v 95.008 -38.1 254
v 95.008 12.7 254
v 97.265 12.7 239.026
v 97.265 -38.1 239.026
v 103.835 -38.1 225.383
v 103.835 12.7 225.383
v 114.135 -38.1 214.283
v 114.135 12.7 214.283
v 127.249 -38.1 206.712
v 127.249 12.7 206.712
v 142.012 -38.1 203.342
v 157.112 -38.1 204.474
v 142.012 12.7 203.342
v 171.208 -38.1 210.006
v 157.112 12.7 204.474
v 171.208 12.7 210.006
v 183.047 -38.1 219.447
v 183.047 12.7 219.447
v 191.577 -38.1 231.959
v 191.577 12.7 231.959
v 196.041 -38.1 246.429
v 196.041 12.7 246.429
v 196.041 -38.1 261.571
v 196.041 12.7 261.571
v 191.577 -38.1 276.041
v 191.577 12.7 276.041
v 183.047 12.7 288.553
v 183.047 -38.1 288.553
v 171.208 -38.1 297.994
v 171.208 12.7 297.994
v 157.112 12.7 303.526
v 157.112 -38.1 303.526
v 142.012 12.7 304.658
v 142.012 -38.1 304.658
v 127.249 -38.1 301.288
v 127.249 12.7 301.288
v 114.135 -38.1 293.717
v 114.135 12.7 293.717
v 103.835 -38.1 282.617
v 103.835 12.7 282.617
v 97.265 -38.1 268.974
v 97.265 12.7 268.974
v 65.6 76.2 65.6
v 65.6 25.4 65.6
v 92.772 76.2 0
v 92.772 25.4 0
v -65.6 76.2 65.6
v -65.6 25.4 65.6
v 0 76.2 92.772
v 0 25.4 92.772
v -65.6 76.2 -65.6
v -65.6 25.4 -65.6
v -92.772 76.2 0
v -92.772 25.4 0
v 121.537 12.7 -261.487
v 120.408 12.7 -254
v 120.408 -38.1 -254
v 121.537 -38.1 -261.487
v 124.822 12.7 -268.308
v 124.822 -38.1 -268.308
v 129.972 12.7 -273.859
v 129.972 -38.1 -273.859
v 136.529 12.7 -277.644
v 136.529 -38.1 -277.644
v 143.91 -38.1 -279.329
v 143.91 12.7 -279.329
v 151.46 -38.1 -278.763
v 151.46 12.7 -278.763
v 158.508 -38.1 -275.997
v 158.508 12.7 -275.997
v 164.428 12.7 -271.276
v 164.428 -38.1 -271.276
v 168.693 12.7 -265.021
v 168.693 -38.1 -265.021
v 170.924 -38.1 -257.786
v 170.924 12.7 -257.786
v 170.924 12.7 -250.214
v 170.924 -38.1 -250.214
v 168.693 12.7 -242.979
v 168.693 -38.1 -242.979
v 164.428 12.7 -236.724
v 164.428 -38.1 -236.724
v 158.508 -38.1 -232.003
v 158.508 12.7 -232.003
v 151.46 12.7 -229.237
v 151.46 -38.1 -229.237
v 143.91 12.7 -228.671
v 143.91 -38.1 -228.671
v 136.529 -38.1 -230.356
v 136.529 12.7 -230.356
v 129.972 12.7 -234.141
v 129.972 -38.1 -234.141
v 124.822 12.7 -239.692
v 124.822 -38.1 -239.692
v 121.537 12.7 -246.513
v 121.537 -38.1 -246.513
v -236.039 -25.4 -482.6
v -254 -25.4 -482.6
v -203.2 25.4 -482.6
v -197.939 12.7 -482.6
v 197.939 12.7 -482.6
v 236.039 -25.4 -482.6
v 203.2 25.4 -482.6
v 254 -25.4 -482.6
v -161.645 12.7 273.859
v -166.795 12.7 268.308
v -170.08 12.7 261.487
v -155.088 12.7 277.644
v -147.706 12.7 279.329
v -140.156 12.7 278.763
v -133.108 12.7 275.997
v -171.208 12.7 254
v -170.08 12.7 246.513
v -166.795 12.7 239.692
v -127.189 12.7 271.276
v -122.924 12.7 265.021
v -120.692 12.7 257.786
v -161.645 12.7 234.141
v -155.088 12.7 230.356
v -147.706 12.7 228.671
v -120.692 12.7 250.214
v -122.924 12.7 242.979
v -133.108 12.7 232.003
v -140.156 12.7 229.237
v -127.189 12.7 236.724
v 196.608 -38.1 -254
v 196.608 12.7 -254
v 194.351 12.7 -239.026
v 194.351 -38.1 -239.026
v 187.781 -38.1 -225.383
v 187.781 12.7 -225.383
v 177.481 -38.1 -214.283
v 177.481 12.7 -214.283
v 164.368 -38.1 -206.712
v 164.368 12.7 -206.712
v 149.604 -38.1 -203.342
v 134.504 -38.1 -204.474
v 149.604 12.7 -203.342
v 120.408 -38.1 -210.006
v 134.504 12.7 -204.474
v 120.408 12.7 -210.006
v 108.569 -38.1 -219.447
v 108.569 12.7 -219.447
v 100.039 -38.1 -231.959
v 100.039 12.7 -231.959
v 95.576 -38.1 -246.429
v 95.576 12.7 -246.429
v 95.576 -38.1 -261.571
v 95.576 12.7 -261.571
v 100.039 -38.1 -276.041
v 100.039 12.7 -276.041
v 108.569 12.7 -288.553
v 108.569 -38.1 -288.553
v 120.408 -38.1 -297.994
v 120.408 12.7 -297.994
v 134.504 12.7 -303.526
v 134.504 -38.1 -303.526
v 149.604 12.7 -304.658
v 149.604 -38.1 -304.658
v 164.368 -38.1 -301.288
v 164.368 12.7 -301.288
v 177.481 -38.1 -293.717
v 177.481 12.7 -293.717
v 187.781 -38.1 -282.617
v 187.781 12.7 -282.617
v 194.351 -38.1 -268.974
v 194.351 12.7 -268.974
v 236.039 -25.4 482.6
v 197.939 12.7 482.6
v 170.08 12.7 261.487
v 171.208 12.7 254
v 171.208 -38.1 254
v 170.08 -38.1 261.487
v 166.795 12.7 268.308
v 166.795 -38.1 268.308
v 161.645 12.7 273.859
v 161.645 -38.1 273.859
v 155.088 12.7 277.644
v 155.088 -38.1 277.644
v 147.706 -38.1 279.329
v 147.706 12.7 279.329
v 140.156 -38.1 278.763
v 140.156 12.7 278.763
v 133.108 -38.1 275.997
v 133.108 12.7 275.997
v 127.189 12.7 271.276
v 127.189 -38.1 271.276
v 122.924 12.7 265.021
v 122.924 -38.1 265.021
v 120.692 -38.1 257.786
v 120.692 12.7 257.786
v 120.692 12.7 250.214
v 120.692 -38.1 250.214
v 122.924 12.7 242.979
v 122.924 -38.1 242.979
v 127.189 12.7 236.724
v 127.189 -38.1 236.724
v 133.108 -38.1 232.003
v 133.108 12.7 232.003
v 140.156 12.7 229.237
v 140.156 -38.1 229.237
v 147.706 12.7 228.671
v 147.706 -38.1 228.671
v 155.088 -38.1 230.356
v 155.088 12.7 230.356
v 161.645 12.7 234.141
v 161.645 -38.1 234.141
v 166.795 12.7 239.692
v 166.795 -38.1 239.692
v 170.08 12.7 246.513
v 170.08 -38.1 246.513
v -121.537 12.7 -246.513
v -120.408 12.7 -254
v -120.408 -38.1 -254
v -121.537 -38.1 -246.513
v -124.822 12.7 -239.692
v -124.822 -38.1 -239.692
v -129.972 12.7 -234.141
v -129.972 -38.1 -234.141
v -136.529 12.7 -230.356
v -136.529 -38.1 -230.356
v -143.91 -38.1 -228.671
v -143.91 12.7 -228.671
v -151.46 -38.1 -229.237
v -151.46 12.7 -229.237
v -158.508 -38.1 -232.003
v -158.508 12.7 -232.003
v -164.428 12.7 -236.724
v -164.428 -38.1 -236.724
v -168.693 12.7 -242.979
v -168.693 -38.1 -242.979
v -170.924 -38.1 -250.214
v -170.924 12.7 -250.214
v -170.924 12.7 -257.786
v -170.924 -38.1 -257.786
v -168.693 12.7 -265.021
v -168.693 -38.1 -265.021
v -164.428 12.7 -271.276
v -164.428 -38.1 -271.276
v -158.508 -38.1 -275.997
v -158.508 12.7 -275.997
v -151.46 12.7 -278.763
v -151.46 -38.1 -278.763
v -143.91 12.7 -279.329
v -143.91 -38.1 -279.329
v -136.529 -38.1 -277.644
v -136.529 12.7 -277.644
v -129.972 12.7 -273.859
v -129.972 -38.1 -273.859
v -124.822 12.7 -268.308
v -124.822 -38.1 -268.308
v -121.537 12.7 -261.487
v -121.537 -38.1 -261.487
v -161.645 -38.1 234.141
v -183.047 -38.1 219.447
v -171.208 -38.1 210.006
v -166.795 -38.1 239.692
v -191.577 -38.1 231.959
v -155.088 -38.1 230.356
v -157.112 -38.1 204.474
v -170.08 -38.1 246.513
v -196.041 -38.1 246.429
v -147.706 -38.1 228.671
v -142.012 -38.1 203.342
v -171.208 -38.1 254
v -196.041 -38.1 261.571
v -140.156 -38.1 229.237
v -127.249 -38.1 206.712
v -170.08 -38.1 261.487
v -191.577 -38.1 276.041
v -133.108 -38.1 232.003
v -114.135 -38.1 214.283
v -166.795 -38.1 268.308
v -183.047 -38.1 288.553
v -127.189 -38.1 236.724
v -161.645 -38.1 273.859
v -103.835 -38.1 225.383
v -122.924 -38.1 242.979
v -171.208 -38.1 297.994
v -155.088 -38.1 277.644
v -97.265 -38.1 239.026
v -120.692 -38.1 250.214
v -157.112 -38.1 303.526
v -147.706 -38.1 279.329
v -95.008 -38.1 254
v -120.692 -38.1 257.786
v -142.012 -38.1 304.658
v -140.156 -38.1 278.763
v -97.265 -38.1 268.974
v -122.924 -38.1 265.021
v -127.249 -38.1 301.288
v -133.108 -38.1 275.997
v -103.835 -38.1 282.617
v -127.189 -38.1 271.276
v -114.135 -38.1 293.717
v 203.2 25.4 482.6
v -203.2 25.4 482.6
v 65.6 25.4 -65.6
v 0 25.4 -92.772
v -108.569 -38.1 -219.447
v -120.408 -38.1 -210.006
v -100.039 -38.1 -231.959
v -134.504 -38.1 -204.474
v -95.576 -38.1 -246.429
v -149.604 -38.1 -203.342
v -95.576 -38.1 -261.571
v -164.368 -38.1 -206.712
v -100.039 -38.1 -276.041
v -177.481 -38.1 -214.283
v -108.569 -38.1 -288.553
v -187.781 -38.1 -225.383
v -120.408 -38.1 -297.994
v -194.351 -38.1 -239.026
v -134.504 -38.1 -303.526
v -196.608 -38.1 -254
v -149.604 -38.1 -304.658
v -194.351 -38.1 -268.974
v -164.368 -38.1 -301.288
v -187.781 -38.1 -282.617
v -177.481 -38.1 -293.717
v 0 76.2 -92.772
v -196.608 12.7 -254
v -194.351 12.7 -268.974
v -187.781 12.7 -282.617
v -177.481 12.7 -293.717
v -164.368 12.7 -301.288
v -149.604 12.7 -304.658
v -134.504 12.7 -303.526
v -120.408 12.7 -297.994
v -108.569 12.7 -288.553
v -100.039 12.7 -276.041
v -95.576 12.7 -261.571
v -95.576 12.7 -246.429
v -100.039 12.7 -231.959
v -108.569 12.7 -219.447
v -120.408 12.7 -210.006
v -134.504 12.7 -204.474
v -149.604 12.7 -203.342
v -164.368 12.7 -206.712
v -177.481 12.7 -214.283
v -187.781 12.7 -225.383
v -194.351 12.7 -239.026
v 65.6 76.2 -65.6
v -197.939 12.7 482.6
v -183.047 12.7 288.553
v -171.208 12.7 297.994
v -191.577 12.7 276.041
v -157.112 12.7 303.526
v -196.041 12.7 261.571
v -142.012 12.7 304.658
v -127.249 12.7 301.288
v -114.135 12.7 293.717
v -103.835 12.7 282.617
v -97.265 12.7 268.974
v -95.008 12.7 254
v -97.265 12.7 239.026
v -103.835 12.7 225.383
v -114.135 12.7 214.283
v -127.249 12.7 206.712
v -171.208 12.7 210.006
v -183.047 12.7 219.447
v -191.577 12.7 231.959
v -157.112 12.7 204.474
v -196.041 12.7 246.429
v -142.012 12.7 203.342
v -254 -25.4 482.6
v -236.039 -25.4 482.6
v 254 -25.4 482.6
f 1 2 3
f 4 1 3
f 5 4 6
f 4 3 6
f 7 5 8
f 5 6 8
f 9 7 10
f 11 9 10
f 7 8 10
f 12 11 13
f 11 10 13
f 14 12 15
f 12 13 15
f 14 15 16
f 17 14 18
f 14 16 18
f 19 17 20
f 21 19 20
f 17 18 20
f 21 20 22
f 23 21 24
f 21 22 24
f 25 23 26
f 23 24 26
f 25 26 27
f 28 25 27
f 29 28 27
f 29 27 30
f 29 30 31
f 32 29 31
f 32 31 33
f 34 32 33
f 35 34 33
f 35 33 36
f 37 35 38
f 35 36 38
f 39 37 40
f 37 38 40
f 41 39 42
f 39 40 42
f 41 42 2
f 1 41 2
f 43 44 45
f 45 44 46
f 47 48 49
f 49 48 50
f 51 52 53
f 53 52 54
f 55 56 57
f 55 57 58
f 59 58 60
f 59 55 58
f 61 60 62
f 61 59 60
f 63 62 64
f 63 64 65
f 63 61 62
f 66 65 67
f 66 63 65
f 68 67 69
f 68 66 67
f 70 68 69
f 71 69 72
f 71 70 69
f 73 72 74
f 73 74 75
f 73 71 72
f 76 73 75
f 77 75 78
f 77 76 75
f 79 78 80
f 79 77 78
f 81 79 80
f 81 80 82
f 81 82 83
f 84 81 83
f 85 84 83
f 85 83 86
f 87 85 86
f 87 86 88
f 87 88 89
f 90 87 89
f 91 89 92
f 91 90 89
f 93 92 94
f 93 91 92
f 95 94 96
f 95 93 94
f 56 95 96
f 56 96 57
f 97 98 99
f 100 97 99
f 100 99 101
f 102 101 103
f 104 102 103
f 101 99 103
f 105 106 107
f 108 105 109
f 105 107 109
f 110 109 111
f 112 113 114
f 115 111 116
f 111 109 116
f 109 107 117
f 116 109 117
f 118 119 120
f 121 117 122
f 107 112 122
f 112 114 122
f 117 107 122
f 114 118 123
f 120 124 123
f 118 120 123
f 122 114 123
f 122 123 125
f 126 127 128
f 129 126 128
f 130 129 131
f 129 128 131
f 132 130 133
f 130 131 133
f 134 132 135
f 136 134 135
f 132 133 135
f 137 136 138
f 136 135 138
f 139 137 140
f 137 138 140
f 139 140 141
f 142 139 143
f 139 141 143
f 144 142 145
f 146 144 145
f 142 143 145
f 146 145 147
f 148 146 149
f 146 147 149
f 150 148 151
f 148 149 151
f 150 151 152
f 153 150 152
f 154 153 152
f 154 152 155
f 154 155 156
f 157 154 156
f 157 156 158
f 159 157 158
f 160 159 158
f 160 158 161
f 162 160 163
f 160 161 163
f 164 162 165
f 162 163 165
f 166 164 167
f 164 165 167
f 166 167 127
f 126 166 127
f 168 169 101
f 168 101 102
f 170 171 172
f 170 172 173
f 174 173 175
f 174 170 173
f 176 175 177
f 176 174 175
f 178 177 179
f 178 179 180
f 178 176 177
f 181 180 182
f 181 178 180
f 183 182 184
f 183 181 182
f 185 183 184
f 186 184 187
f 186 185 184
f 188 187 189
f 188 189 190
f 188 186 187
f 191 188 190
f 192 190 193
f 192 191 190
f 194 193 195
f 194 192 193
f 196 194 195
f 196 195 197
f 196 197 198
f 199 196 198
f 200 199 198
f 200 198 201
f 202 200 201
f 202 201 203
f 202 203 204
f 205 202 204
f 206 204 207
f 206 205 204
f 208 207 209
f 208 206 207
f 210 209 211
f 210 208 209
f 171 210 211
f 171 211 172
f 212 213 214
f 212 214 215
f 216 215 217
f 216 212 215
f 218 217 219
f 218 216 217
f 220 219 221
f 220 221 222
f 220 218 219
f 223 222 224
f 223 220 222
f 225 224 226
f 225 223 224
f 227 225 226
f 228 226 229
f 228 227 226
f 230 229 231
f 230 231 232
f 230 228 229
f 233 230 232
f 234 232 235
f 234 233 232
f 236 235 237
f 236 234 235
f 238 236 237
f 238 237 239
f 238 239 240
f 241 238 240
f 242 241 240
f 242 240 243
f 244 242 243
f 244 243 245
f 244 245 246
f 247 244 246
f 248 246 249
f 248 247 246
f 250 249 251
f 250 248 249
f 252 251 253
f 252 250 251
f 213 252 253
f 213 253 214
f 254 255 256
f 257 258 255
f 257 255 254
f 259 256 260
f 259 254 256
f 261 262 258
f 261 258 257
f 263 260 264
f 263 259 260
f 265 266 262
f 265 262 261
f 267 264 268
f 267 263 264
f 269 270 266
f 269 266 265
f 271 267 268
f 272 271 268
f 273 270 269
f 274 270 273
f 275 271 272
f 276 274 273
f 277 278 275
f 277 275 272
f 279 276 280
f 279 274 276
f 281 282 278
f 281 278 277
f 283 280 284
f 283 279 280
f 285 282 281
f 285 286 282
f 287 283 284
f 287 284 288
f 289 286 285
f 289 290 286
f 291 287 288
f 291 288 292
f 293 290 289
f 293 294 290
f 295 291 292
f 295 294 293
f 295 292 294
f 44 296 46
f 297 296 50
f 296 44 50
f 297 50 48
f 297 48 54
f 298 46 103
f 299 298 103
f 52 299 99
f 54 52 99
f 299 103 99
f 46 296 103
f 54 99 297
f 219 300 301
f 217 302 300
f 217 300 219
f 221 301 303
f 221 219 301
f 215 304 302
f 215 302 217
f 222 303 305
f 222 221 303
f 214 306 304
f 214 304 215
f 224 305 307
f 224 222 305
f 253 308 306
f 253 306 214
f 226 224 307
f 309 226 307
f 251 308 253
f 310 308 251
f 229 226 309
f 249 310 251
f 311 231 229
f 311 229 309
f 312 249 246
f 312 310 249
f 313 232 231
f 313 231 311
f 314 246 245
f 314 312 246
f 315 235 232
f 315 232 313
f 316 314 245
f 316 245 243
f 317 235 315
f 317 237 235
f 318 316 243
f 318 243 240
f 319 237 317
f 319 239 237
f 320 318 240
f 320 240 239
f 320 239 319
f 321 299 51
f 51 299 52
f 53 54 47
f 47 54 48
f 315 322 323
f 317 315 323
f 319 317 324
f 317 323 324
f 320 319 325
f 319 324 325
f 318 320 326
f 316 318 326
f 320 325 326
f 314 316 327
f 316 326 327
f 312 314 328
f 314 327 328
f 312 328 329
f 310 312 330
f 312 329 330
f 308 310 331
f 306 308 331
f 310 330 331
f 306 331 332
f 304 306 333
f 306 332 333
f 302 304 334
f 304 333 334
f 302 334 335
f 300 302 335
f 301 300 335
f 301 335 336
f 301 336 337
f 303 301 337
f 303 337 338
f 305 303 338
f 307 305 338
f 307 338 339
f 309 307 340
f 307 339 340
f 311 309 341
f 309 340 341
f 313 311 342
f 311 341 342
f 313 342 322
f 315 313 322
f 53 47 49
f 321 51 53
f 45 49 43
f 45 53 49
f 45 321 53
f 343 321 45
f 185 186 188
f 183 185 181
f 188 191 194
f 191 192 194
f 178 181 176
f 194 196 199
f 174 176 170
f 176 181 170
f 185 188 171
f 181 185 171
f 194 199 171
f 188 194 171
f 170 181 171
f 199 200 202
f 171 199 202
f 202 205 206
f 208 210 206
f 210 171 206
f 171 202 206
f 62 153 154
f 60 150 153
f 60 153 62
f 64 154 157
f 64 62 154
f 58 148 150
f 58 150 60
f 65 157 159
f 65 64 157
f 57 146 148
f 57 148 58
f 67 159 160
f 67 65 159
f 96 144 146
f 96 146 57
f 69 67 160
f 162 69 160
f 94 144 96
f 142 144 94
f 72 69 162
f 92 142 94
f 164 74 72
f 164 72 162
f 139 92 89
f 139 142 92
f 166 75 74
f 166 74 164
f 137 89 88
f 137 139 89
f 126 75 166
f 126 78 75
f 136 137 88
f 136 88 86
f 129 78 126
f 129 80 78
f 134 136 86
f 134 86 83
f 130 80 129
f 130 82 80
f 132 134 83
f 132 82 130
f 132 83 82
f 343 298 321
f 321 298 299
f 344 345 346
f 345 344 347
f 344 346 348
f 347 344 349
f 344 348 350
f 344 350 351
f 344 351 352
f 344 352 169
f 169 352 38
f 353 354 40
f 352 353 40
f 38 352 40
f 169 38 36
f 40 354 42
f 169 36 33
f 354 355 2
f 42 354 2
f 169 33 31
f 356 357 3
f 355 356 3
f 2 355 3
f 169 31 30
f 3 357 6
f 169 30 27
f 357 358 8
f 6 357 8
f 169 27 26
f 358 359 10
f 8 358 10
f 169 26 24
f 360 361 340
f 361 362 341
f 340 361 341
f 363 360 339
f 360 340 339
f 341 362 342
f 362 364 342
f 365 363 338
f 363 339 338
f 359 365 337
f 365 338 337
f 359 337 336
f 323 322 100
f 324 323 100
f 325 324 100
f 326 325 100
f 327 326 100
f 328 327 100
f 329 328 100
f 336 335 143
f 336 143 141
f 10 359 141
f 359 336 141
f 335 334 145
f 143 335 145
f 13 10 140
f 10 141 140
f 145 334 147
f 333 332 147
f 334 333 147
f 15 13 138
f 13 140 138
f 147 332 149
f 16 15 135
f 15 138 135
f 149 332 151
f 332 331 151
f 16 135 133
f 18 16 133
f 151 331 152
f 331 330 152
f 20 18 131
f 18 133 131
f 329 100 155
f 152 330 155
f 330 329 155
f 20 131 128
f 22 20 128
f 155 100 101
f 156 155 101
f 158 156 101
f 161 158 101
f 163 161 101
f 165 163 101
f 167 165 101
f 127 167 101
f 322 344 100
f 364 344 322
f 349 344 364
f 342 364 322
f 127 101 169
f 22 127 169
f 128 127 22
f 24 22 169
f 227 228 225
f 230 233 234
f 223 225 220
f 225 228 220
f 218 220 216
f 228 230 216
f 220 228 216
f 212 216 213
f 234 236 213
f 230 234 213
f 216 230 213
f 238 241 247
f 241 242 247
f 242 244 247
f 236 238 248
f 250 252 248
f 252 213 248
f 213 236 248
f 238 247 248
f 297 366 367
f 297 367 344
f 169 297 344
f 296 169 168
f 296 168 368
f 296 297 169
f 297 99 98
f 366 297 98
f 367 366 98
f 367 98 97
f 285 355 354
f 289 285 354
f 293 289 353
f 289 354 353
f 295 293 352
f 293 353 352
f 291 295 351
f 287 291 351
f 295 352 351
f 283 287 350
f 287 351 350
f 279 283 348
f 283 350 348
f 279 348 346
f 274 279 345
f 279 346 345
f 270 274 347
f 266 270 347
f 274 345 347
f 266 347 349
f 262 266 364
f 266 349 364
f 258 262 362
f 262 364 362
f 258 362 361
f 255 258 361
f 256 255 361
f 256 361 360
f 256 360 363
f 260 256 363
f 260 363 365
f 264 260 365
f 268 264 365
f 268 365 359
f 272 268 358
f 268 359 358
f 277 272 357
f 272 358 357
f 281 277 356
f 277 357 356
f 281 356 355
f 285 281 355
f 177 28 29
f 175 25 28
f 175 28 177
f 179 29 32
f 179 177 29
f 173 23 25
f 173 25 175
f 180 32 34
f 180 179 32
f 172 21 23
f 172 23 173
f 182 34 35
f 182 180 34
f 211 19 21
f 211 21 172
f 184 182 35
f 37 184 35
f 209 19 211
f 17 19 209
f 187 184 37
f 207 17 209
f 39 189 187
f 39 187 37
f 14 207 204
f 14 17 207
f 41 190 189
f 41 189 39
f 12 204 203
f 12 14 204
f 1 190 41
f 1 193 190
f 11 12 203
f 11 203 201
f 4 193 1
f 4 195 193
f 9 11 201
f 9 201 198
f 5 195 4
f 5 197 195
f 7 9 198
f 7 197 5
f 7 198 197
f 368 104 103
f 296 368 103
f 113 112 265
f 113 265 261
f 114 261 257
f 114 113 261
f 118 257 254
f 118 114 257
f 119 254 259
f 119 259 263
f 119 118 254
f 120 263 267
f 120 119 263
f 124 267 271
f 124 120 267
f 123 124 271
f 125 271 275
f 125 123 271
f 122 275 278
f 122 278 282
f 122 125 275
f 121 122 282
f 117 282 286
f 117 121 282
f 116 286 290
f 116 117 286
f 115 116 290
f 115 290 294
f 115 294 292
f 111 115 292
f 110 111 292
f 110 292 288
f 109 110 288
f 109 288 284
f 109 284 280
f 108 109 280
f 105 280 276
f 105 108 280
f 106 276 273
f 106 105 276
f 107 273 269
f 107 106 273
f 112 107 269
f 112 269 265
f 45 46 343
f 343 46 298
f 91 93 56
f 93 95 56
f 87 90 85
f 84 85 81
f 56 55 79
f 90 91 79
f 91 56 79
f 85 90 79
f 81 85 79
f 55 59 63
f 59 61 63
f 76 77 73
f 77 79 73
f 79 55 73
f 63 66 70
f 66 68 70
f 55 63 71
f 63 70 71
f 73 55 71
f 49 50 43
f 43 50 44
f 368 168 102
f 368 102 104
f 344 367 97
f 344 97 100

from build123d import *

# Parameters (mm, degrees)
BOSS_EXTRUDE4_DEPTH = 965.2
SKETCH61_R          = 50.8
SKETCH61_R_2        = 25.4
BOSS_EXTRUDE5_DEPTH = 50.8
BOSS_EXTRUDE6_DEPTH = 50.8


with BuildPart() as part:
    # Sketch1 → Boss-Extrude4 (new body)
    with BuildSketch(Plane.XY):
        Polygon((-203.2, 25.4), (-254, -25.4), (-236.039487758, -25.4), (-223.339487758, -12.7), (-197.939487758, 12.7), (-185.239487758, 25.4), align=None)
        Polygon((203.2, 25.4), (-185.239487758, 25.4), (-197.939487758, 12.7), (197.939487758, 12.7), (223.339487758, -12.7), (236.039487758, -25.4), (254, -25.4), align=None)
    extrude(amount=BOSS_EXTRUDE4_DEPTH)


with BuildPart() as part_1:
    # Body-Move/Copy1: moved
    add(part.part.moved(Location((0, 0, -482.6))))

    # Sketch61 → Boss-Extrude5 (add)
    # profile 1 of 4: a face of its own
    with BuildSketch(Plane.XZ.offset(-12.7)):
        with Locations((-145.808181247, 254)):
            Circle(SKETCH61_R)
        with Locations(Location((-145.808181247, 254, 0), (0, 0, 180))):
            Circle(SKETCH61_R_2, mode=Mode.SUBTRACT)
    # profile 2 of 4: a face of its own
    with BuildSketch(Plane.XZ.offset(-12.7)):
        with Locations(Location((145.808181247, 254, 0), (0, 0, 180))):
            Circle(SKETCH61_R)
        with Locations((145.808181247, 254)):
            Circle(SKETCH61_R_2, mode=Mode.SUBTRACT)
    # profile 3 of 4: a face of its own
    with BuildSketch(Plane.XZ.offset(-12.7)):
        with Locations((145.808181247, -254)):
            Circle(SKETCH61_R)
        with Locations(Location((145.808181247, -254, 0), (0, 0, 180))):
            Circle(SKETCH61_R_2, mode=Mode.SUBTRACT)
    # profile 4 of 4: a face of its own
    with BuildSketch(Plane.XZ.offset(-12.7)):
        with Locations(Location((-145.808181247, -254, 0), (0, 0, 180))):
            Circle(SKETCH61_R)
        with Locations((-145.808181247, -254)):
            Circle(SKETCH61_R_2, mode=Mode.SUBTRACT)
    extrude(amount=BOSS_EXTRUDE5_DEPTH)

    # Sketch62 → Boss-Extrude6 (add)
    with BuildSketch(Plane(origin=(0, 25.4, 0), x_dir=(1, 0, 0), z_dir=(0, 1, 0))):
        Polygon((0, -92.772173632), (65.599833081, -65.599833081), (92.772173632, 0), (65.599833081, 65.599833081), (0, 92.772173632), (-65.599833081, 65.599833081), (-92.772173632, 0), (-65.599833081, -65.599833081), align=None)
    extrude(amount=BOSS_EXTRUDE6_DEPTH)


solid = part_1.part
